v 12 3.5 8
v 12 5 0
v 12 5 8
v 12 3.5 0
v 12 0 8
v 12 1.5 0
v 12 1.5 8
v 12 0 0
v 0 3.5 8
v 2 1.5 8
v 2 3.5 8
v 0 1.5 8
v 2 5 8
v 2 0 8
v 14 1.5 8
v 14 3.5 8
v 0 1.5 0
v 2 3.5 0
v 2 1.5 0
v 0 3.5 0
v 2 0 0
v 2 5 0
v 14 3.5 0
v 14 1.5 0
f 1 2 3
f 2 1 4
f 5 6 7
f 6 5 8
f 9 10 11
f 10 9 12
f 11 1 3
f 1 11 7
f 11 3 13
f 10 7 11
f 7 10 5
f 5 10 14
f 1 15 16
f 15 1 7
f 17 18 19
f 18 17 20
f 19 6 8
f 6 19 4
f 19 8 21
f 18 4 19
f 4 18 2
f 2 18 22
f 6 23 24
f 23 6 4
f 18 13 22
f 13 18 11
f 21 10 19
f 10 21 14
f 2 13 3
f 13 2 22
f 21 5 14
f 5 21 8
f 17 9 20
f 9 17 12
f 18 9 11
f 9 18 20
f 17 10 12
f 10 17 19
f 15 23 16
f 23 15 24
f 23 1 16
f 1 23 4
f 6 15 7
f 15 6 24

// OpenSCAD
module FrexySideInsert(
width=10,
length=5,
height=8,
side_cube_width=2,
side_cube_length=2
) {
    translate([side_cube_width,0,0]) union() {
        cube([width,length,height]);
        translate([-side_cube_width,length/2-side_cube_length/2,0]) cube([side_cube_width,side_cube_length,height]);
        translate([width,length/2-side_cube_length/2,0]) cube([side_cube_width,side_cube_length,height]);
    }
}

FrexySideInsert();
